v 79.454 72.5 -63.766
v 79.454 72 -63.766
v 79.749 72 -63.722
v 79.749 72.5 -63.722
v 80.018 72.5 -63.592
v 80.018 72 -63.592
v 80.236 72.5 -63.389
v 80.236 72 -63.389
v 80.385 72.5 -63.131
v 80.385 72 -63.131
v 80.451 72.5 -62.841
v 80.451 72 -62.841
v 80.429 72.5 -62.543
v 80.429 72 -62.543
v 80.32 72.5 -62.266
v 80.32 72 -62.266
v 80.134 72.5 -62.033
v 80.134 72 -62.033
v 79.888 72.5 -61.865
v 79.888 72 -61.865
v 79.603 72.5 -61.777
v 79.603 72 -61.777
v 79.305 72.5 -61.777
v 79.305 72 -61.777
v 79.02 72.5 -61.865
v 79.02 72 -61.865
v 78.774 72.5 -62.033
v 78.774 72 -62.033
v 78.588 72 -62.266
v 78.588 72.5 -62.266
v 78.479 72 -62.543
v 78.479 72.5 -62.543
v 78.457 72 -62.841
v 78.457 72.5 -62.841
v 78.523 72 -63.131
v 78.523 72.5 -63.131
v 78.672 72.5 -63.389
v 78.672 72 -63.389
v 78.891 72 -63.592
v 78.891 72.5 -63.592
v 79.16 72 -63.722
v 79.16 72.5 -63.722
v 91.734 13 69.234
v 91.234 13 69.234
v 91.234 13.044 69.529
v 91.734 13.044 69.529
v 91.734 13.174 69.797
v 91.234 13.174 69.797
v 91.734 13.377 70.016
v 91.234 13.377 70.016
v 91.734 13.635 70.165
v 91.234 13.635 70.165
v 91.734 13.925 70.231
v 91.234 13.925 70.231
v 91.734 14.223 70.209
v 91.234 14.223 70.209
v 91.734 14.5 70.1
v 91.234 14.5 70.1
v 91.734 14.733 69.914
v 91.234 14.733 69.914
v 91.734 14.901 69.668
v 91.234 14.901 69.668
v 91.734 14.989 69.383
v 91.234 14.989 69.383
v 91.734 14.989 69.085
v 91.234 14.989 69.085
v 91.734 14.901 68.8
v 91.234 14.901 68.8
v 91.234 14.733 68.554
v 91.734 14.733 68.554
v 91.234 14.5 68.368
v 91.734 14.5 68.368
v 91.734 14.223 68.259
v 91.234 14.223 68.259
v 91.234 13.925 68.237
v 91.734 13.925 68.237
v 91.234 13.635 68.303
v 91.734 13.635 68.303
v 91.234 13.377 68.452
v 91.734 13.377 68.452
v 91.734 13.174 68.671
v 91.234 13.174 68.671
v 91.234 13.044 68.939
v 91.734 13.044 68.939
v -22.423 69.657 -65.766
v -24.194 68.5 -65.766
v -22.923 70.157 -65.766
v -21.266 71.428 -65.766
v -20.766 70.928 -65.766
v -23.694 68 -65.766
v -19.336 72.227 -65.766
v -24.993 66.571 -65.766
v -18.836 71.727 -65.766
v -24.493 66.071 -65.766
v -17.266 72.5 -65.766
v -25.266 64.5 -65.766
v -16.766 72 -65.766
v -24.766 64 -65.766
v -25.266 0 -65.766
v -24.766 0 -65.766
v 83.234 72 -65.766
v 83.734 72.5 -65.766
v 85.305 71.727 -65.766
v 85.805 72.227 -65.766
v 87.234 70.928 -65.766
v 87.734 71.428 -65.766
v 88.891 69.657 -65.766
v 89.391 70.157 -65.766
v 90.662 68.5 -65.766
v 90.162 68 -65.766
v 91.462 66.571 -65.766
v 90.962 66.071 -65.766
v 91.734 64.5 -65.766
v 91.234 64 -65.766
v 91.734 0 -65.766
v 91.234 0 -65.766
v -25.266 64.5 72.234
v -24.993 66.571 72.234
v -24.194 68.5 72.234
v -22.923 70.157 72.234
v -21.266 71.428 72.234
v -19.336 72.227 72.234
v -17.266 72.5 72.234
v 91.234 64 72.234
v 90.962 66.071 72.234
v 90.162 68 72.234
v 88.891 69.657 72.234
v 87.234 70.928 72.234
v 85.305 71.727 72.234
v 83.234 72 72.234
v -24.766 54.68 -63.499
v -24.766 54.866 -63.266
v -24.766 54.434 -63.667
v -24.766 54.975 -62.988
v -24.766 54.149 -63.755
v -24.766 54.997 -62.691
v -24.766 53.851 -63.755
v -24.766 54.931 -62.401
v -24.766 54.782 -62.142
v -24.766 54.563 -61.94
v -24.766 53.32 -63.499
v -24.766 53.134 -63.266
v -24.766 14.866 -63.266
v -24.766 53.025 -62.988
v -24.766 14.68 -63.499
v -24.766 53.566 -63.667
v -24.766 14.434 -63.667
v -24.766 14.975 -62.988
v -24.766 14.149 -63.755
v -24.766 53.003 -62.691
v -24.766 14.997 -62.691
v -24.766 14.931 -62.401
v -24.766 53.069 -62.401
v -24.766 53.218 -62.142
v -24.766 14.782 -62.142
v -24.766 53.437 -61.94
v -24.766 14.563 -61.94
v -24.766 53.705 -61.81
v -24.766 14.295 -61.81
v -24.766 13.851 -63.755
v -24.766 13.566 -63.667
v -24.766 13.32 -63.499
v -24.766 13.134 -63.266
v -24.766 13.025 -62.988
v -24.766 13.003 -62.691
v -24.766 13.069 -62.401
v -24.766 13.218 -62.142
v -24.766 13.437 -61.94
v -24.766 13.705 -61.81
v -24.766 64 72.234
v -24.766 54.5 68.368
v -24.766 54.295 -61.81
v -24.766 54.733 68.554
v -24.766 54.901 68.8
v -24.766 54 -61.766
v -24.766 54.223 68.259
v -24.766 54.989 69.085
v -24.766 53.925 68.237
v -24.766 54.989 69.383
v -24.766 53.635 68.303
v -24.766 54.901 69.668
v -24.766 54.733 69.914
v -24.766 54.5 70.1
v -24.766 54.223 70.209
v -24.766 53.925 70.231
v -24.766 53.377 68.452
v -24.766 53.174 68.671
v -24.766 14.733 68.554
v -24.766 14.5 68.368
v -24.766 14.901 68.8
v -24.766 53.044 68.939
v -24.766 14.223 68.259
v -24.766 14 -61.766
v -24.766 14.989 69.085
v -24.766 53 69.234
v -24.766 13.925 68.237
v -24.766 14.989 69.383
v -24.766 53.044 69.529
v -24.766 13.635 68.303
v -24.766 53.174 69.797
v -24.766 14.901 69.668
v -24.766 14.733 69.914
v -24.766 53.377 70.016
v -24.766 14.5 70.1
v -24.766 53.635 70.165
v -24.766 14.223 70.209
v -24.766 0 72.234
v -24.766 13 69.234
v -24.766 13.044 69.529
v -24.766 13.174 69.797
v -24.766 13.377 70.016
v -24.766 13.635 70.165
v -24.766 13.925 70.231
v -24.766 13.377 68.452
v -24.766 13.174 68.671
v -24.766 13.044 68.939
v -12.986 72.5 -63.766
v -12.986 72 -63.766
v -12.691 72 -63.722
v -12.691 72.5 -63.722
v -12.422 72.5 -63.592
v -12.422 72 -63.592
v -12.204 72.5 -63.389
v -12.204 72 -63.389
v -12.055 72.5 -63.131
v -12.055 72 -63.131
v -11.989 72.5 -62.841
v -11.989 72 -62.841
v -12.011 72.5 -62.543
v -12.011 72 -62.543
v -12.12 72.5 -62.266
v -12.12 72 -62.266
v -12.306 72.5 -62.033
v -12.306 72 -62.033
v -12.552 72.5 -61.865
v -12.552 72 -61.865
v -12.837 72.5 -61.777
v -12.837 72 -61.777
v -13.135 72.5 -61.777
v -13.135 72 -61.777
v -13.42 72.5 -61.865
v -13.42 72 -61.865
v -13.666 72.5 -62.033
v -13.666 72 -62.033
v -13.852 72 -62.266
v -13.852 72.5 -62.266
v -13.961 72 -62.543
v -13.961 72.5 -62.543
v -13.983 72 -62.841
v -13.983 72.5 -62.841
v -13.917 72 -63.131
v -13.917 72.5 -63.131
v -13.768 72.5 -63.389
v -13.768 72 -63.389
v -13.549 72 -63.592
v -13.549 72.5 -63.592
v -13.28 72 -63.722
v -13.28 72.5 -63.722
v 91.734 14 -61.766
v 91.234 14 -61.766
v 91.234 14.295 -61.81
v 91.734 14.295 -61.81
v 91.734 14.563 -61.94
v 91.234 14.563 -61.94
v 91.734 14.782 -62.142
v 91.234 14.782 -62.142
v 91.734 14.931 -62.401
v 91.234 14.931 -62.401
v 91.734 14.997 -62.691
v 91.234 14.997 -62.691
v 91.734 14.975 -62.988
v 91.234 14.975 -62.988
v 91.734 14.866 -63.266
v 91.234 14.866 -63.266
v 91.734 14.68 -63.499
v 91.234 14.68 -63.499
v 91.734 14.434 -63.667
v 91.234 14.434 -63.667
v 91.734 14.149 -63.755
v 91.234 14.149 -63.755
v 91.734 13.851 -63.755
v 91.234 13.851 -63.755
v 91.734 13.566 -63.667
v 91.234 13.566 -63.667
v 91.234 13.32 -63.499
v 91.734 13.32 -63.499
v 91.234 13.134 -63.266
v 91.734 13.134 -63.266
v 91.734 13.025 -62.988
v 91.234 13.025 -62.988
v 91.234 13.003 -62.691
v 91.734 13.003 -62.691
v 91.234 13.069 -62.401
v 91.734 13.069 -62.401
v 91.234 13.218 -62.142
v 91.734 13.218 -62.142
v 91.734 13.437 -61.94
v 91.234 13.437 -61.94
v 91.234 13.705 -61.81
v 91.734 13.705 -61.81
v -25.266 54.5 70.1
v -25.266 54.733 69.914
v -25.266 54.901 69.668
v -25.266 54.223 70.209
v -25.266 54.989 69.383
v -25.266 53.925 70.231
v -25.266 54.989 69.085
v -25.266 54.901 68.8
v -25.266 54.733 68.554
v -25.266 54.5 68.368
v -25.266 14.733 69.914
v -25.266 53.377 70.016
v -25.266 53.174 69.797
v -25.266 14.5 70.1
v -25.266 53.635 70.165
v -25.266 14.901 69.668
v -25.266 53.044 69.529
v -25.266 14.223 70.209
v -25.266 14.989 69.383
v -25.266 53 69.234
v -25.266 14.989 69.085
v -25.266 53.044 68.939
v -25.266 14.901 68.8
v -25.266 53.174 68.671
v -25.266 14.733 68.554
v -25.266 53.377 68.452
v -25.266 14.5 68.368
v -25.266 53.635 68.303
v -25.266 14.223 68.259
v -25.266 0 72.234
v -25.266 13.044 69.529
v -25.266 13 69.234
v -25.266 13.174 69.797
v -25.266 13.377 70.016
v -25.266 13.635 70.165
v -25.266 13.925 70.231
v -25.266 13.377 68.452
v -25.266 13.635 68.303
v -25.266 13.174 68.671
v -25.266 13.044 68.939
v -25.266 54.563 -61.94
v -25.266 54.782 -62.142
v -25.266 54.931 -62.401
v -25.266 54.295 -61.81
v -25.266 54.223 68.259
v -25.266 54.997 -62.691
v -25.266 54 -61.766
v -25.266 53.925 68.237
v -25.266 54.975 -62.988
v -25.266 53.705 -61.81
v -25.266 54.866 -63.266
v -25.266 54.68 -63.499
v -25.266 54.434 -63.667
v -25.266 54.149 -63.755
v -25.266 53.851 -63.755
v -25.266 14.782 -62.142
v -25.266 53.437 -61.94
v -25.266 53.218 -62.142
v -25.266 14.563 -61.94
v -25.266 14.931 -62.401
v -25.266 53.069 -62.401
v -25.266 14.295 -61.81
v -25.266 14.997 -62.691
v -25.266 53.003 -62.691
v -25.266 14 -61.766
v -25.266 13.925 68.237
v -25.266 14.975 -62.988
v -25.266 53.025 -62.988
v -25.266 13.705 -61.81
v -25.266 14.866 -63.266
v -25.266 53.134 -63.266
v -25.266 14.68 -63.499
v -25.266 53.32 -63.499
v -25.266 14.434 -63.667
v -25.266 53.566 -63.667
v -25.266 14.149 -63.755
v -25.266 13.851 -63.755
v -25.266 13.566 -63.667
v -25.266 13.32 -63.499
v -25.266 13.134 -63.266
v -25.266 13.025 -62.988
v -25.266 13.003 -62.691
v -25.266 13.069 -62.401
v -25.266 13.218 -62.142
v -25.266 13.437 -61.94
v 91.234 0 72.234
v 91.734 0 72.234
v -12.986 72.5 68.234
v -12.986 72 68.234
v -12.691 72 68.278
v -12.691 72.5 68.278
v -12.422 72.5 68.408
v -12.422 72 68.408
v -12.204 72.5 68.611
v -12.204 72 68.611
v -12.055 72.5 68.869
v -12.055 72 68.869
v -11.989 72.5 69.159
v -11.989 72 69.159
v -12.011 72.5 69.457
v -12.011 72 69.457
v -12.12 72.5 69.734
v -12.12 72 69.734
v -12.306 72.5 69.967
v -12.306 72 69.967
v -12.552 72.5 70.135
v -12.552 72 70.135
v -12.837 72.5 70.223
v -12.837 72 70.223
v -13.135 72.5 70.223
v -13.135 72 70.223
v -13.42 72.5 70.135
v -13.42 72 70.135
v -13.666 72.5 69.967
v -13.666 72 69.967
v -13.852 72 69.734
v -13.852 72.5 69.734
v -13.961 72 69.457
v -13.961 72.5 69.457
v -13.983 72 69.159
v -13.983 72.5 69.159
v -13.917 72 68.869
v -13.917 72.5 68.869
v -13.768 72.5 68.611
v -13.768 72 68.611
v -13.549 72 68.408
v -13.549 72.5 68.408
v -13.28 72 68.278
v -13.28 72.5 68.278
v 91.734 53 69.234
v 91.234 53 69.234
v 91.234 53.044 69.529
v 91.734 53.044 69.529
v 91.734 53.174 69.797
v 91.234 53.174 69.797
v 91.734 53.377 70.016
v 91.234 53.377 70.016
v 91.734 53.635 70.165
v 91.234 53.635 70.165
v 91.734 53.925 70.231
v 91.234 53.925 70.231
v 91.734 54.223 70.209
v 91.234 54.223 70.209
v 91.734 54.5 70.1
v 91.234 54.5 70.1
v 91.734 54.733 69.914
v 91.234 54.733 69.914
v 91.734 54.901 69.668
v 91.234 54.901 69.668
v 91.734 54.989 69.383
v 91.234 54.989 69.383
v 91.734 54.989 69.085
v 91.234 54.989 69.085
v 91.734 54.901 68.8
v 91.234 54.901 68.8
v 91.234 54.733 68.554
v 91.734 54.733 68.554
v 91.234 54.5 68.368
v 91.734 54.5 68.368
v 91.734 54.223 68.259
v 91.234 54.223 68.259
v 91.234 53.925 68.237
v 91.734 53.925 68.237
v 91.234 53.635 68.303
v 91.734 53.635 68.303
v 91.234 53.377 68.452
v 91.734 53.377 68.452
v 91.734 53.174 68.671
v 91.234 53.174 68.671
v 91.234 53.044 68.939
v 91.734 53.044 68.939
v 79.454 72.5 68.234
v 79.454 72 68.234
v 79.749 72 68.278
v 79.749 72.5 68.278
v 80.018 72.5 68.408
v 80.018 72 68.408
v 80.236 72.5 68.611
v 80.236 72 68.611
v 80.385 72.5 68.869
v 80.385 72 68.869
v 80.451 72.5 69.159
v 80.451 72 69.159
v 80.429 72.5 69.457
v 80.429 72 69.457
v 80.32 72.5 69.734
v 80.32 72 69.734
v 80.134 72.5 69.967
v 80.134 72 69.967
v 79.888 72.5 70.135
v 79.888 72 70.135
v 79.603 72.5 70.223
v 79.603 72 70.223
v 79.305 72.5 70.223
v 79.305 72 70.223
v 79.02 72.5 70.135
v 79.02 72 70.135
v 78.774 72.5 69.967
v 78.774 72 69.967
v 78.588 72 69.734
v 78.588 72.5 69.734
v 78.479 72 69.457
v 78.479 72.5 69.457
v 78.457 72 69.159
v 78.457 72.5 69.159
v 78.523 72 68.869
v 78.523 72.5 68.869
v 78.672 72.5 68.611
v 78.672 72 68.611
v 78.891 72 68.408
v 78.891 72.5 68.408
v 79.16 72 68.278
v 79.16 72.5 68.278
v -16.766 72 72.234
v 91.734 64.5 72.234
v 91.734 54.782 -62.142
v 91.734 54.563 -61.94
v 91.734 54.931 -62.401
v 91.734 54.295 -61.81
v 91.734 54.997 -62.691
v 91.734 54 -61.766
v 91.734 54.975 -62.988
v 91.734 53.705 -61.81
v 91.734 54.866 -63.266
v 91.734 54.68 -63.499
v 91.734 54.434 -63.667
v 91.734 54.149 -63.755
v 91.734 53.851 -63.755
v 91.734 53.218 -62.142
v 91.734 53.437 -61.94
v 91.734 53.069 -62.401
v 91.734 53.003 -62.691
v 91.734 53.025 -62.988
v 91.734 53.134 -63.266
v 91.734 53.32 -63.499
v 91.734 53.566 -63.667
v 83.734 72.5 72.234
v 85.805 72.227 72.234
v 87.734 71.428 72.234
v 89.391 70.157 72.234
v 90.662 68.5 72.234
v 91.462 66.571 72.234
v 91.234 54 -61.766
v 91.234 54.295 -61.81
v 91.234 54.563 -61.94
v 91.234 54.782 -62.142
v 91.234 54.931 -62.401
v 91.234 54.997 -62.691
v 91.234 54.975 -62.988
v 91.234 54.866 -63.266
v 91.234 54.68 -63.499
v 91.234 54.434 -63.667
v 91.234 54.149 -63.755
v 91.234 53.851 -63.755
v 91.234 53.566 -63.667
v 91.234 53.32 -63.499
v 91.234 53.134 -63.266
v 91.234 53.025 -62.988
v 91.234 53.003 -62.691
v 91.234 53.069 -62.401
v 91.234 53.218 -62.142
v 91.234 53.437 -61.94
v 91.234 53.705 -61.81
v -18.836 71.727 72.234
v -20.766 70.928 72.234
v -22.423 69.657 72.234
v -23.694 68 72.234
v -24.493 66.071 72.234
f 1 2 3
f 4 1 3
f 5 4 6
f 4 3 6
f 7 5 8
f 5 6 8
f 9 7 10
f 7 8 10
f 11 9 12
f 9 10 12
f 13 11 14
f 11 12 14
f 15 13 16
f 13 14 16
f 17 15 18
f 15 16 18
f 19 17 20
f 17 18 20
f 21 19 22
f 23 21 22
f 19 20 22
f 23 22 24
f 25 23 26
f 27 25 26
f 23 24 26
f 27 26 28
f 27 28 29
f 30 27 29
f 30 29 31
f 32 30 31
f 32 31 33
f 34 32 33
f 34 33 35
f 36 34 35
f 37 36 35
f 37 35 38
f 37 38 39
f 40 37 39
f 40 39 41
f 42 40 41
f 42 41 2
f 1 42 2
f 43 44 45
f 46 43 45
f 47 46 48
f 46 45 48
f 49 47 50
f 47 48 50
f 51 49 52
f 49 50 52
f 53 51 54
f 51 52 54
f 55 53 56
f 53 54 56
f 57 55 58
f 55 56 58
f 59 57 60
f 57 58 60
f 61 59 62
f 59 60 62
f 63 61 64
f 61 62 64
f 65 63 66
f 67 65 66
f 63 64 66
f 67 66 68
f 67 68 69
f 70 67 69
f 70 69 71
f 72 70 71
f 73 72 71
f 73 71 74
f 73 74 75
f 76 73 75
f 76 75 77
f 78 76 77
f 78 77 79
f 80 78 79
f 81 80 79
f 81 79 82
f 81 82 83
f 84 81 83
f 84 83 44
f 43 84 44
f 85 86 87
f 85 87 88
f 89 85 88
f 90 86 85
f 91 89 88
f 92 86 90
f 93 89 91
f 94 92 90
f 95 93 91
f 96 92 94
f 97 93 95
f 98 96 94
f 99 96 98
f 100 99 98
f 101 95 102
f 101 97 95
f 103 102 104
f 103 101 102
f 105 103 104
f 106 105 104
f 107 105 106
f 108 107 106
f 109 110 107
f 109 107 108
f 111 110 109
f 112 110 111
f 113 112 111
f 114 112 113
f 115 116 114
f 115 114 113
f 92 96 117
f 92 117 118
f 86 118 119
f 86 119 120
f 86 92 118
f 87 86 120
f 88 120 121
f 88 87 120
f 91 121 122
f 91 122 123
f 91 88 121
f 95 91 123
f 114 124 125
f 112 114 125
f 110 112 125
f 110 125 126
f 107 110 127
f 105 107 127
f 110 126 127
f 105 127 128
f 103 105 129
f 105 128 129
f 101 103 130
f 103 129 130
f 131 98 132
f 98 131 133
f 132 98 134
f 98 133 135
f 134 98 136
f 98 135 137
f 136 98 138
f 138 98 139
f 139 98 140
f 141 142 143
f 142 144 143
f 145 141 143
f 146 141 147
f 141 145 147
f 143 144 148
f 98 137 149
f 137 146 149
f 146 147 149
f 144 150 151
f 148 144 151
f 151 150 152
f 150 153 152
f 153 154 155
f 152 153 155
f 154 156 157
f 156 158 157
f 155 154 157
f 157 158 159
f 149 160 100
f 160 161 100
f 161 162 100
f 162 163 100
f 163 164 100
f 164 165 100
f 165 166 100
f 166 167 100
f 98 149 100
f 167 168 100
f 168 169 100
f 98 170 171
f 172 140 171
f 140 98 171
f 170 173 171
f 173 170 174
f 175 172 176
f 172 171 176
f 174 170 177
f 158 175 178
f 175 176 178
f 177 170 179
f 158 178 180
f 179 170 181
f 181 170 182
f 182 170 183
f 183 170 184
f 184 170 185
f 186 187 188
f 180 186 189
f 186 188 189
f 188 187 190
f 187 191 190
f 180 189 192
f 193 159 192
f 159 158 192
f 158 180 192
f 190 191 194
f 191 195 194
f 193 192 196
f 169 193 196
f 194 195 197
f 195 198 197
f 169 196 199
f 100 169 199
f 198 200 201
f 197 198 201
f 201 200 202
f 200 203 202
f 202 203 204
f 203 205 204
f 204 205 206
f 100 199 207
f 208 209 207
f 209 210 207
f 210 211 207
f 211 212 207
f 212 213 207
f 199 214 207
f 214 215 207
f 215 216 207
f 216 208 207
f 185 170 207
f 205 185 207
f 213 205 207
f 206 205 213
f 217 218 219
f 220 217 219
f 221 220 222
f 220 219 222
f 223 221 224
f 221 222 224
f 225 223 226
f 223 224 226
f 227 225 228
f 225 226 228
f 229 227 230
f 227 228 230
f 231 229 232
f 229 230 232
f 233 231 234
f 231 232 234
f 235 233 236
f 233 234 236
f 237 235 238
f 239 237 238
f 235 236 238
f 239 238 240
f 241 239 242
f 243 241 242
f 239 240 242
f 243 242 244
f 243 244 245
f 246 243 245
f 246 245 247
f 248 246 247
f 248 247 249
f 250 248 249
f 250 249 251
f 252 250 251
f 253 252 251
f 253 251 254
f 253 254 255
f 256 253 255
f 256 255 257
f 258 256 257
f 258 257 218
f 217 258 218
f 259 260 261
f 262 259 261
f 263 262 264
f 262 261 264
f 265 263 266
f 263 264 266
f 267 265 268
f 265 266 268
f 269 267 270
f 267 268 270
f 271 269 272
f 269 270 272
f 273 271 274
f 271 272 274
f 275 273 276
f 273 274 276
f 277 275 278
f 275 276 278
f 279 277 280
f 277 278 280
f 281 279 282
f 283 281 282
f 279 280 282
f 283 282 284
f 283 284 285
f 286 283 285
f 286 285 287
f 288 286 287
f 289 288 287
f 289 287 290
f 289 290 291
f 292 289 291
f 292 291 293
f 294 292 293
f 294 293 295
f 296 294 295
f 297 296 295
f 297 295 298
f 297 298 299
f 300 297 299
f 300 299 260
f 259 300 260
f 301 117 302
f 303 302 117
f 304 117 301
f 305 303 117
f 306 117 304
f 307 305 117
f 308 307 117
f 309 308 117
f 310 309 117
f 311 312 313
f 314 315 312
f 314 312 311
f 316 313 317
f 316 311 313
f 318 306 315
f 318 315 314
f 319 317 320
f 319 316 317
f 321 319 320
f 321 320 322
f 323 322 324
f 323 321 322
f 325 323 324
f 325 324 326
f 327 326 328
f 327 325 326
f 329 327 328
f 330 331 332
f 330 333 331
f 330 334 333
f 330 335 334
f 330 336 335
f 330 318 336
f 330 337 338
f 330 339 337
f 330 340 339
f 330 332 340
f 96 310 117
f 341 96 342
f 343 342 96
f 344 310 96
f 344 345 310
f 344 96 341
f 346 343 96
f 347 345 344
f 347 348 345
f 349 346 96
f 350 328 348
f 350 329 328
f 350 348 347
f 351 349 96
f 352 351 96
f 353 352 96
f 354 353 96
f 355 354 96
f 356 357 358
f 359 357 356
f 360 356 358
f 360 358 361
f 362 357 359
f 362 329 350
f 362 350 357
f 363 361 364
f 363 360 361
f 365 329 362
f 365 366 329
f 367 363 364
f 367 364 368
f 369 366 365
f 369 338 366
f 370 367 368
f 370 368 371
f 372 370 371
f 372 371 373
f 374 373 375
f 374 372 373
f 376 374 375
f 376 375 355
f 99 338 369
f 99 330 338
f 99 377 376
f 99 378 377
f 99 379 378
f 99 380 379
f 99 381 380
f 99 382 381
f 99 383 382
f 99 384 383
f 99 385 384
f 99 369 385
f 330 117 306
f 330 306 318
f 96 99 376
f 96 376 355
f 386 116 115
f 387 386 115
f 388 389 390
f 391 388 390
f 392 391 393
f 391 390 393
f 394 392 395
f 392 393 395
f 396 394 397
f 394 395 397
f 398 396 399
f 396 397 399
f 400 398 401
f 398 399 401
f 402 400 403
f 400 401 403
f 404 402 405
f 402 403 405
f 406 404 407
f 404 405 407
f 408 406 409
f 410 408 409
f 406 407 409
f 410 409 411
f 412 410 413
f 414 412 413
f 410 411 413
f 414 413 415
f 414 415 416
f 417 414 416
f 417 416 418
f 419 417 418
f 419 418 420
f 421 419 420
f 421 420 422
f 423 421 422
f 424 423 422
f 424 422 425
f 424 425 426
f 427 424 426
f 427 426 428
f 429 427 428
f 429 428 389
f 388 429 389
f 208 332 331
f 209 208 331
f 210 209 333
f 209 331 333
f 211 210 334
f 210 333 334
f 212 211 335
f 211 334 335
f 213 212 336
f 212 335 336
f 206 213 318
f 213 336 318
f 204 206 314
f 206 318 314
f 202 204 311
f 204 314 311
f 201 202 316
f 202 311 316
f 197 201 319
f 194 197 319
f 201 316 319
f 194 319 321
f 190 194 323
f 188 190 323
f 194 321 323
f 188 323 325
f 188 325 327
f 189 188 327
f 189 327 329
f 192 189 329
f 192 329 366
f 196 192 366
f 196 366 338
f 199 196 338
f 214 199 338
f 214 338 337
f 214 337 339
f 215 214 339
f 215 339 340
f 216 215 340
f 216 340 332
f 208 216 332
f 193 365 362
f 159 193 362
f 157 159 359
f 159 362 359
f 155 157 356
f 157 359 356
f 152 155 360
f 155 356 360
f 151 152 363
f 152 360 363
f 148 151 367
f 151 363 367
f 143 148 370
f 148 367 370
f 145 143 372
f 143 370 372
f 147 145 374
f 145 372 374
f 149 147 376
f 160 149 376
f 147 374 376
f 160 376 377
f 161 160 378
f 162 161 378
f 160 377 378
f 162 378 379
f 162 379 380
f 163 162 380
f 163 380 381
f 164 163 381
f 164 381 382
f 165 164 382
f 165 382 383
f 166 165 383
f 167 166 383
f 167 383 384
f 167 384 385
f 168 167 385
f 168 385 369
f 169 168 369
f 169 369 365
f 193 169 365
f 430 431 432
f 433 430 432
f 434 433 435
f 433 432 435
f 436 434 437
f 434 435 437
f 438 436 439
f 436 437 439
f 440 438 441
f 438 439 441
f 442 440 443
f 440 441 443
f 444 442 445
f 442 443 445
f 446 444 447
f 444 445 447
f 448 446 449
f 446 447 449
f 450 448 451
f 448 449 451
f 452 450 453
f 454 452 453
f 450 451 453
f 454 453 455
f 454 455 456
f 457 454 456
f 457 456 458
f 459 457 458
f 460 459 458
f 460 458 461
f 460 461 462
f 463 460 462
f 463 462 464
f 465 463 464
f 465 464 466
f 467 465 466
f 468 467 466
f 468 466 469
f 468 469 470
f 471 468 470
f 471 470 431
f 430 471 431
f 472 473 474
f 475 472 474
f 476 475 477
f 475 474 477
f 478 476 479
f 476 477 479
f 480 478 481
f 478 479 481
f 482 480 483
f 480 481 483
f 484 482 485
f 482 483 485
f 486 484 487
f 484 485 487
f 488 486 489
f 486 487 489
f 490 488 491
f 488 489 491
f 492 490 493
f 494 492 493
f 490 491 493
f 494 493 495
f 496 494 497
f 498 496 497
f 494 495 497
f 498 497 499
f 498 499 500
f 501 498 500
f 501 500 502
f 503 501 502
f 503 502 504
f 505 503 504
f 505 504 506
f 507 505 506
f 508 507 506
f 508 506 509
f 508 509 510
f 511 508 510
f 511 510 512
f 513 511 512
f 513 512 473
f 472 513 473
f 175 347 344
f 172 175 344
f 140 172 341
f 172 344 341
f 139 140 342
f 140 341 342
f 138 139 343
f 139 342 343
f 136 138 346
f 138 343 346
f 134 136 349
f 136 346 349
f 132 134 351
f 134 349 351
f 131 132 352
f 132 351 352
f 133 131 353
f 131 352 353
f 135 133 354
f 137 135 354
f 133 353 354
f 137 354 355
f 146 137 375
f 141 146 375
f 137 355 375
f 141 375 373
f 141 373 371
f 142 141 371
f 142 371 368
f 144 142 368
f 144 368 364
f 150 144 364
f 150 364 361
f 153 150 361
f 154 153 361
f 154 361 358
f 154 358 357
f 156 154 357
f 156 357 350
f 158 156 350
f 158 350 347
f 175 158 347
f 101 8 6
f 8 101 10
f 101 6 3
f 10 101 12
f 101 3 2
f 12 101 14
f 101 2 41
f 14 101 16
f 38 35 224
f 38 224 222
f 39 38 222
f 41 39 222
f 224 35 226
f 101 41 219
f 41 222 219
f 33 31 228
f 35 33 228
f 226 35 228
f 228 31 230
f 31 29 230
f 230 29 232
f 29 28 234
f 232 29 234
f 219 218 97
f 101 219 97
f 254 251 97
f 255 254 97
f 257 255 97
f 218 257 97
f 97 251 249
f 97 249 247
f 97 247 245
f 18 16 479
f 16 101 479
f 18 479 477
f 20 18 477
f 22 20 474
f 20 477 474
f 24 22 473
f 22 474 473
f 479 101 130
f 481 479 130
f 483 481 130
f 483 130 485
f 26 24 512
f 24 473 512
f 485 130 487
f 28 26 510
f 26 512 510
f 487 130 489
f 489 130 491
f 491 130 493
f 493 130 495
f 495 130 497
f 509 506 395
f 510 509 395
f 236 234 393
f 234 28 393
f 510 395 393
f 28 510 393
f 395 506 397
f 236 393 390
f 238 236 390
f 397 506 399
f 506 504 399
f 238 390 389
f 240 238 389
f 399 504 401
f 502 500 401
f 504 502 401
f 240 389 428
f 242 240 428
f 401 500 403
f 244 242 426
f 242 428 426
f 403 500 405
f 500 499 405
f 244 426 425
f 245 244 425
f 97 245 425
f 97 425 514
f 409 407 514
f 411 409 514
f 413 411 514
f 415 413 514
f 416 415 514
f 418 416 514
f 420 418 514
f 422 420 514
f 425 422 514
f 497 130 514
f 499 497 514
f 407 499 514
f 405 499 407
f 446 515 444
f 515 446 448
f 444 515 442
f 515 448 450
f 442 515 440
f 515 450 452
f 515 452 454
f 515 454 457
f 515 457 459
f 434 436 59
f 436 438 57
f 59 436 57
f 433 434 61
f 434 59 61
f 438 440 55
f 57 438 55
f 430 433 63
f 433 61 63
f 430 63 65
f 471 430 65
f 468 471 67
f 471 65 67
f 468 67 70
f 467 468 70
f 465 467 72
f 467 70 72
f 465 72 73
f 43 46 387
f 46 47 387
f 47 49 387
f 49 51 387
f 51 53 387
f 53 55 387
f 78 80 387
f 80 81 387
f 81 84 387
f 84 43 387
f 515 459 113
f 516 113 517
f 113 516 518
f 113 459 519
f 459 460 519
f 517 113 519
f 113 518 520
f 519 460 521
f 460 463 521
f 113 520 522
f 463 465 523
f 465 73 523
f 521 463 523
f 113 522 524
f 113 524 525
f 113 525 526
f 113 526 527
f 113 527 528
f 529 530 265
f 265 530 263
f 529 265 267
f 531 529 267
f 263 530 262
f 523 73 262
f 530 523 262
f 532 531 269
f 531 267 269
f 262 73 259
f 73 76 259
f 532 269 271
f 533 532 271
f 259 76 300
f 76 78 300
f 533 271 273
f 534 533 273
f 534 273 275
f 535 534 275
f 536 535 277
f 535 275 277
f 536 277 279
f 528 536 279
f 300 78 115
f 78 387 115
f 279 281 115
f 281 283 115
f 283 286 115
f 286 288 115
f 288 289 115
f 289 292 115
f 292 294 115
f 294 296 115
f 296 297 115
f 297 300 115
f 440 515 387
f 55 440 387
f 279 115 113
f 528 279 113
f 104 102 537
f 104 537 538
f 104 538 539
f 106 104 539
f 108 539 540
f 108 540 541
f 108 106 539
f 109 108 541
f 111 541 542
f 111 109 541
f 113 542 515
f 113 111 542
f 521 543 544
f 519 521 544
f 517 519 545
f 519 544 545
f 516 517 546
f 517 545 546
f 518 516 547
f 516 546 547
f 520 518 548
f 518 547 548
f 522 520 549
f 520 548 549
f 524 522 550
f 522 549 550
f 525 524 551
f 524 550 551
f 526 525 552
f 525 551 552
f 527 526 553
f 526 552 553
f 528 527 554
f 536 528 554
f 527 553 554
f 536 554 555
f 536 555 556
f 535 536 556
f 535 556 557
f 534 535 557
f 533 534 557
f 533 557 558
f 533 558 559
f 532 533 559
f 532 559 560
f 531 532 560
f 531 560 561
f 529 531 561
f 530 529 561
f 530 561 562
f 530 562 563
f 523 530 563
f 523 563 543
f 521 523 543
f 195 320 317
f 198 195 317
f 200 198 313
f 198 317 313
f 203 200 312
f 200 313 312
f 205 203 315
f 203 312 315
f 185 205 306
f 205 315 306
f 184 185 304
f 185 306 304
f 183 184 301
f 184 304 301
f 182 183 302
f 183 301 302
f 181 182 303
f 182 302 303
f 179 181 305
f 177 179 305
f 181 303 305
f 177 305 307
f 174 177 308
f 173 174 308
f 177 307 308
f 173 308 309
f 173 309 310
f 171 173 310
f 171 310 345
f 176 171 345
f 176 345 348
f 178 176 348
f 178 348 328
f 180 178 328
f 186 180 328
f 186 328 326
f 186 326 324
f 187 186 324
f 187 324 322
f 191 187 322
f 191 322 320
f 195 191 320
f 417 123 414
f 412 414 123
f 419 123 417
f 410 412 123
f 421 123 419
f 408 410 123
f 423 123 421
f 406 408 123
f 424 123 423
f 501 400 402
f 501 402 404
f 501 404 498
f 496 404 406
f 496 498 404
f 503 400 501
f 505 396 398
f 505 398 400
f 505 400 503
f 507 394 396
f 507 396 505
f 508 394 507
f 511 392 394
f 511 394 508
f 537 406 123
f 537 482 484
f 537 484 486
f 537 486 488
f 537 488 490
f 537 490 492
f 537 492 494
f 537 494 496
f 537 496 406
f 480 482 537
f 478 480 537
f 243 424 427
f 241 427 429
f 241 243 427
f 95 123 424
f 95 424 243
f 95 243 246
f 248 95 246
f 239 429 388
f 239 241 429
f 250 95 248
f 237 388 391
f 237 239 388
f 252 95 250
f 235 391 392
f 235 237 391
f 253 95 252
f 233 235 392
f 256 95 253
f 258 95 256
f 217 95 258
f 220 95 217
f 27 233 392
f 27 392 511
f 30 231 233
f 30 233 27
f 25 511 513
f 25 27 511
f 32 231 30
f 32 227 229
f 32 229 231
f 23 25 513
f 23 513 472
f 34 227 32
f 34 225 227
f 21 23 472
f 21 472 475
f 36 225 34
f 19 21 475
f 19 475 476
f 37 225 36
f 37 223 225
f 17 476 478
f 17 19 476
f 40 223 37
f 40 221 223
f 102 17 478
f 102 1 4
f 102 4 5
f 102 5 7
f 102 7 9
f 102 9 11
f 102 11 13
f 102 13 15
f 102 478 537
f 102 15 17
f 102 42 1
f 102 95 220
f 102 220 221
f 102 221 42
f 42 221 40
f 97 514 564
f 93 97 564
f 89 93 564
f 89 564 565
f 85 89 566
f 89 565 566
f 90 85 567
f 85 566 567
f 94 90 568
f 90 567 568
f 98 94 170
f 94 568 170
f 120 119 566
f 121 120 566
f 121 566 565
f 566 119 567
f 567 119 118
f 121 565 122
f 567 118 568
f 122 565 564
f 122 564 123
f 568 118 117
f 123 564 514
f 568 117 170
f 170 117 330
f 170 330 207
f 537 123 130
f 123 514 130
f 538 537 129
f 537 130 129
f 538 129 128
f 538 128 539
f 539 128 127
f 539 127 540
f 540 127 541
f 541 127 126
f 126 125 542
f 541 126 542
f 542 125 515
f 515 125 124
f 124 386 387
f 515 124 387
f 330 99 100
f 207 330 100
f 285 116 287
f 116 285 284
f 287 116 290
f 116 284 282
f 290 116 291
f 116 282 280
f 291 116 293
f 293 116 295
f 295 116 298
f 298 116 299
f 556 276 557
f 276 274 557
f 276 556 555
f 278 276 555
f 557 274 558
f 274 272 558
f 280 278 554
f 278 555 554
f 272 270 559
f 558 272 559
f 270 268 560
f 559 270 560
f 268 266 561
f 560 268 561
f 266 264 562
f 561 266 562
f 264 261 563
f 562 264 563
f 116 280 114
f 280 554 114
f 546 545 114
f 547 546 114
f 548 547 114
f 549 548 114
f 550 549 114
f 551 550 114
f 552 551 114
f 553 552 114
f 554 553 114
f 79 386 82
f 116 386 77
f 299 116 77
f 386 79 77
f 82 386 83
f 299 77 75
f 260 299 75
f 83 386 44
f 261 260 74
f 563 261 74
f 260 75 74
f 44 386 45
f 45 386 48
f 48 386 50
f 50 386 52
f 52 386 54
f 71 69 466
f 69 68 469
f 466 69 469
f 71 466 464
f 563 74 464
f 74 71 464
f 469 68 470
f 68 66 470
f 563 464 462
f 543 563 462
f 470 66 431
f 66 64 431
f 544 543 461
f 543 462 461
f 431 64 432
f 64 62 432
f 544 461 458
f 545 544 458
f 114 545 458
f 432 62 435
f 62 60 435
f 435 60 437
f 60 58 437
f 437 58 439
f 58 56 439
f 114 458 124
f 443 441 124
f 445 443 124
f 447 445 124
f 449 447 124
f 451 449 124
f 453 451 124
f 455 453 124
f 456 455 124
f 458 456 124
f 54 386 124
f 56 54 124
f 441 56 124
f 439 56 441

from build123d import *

# Parameters (mm, degrees)
SKETCH_1_W          = 117
SKETCH_1_H          = 138
EXTRUDE_1_DEPTH     = 72.5
CUT_EXTRUDE_1_DEPTH = 140
CUT_EXTRUDE_2_DEPTH = 140
SKETCH_6_R          = 1
CUT_EXTRUDE_5_DEPTH = 140
SKETCH_7_R          = 1
CUT_EXTRUDE_7_DEPTH = 140


with BuildPart() as part:
    # Эскиз1 → Бобышка-Вытянуть1 (new body)
    with BuildSketch(Plane(origin=(0, 0, 0), x_dir=(1, 0, 0), z_dir=(0, 1, 0))):
        with Locations((33.234281685, -3.234040823)):
            Rectangle(SKETCH_1_W, SKETCH_1_H)
    extrude(amount=EXTRUDE_1_DEPTH)

    # Эскиз2 → Вырез-Вытянуть1 (cut)
    with BuildSketch(Plane(origin=(0, 0, -65.765959177), x_dir=(-1, 0, 0), z_dir=(0, 0, -1))):
        with BuildLine():
            Line((-91.734281685, 64.5), (-91.734281685, 72.5))
            Line((-91.734281685, 72.5), (-83.734281685, 72.5))
            ThreePointArc((-83.734281685, 72.5), (-89.391135935, 70.156854249), (-91.734281685, 64.5))
        make_face()
        with BuildLine():
            Line((17.265718315, 72.5), (25.265718315, 72.5))
            Line((25.265718315, 72.5), (25.265718315, 64.5))
            ThreePointArc((25.265718315, 64.5), (22.922572564, 70.156854249), (17.265718315, 72.5))
        make_face()
    extrude(amount=-CUT_EXTRUDE_1_DEPTH, mode=Mode.SUBTRACT)

    # Эскиз3 → Вырез-Вытянуть2 (cut)
    with BuildSketch(Plane.XY.offset(72.234040823)):
        with BuildLine():
            Line((-24.765718315, 0), (91.234281685, 0))
            Line((91.234281685, 0), (91.234281685, 64))
            ThreePointArc((91.234281685, 64), (88.891135935, 69.656854249), (83.234281685, 72))
            Line((83.234281685, 72), (-16.765718315, 72))
            ThreePointArc((-16.765718315, 72), (-22.422572564, 69.656854249), (-24.765718315, 64))
            Line((-24.765718315, 64), (-24.765718315, 0))
        make_face()
    extrude(amount=-CUT_EXTRUDE_2_DEPTH, mode=Mode.SUBTRACT)

    # Эскиз6 → Вырез-Вытянуть5 (cut)
    with BuildSketch(Plane.ZY.offset(25.265718315)):
        with Locations((-62.765959177, 14)):
            Circle(SKETCH_6_R)
        with Locations(Location((69.234040823, 14, 0), (0, 0, 270))):
            Circle(SKETCH_6_R)
        with Locations((-62.765959177, 54)):
            Circle(SKETCH_6_R)
        with Locations(Location((69.234040823, 54, 0), (0, 0, 270))):
            Circle(SKETCH_6_R)
    extrude(amount=-CUT_EXTRUDE_5_DEPTH, mode=Mode.SUBTRACT)

    # Эскиз7 → Вырез-Вытянуть7 (cut)
    with BuildSketch(Plane(origin=(0, 72, 0), x_dir=(-1, 0, 0), z_dir=(0, -1, 0))):
        with Locations(Location((-79.454291209, 62.765959177, 0), (0, 0, 90))):
            Circle(SKETCH_7_R)
        with Locations((-582.904668668, 16.142688411)):
            Circle(SKETCH_7_R)
        with Locations(Location((12.9857274, -69.234040823, 0), (0, 0, 90))):
            Circle(SKETCH_7_R)
        with Locations(Location((-79.454291209, -69.234040823, 0), (0, 0, 90))):
            Circle(SKETCH_7_R)
        with Locations(Location((12.985727838, 62.765959177, 0), (0, 0, 90))):
            Circle(SKETCH_7_R)
    extrude(amount=-CUT_EXTRUDE_7_DEPTH, mode=Mode.SUBTRACT)


solid = part.part
